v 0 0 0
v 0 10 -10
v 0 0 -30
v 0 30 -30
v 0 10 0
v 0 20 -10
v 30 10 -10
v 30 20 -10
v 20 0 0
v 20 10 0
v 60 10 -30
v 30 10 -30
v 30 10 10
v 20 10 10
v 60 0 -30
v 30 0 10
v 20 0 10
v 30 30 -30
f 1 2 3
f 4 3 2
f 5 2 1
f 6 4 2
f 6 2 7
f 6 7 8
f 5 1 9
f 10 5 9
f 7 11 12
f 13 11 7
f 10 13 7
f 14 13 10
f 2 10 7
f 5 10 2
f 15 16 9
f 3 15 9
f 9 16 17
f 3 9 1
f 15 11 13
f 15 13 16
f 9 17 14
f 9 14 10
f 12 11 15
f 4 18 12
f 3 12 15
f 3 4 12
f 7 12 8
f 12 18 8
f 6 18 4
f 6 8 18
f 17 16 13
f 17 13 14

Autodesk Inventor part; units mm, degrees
ref_plane "YZ Plane" through (0, 0, 0) normal (1, 0, 0) x (0, 1, 0)
ref_plane "XZ Plane" through (0, 0, 0) normal (0, 1, 0) x (-1, 0, 0)
ref_plane "XY Plane" through (0, 0, 0) normal (0, 0, 1) x (1, 0, 0)
sketch "草圖1" plane through (0, 0, 0) normal (0, 1, 0) x (-1, 0, 0)
  line L0 (0, 0) -> (-20, 0)
  line L1 (-20, 0) -> (-20, -30)
  line L2 (-20, -30) -> (0, -30)
  line L3 (0, -30) -> (0, 0)
  line L4 (-20, -30) -> (-60, -30)
  line L5 (-60, -30) -> (-60, 10)
  line L6 (-60, 10) -> (-20, 10)
  line L7 (-20, 10) -> (-20, -30)
  dimension "d0" = 20
  dimension "d1" = 40
  dimension "d2" = 40
  dimension "d3" = 30
extrude "擠出1" add sketch "草圖1" along normal blind 10
chamfer "倒角1" distance 30 distance2 40 1 edges at (60, 5, 10) measured on face at (33.3333, 3.3333, 10)
sketch "草圖2" plane through (0, 0, -30) normal (-1, 0, 0) x (0, 0, 1)
  line L0 (0, 0) -> (0, 10) projected
  line L1 (0, 10) -> (20, 10)
  line L2 (20, 10) -> (20, 30)
  line L3 (20, 30) -> (0, 30)
  line L4 (0, 30) -> (0, 10)
  point P0 (30, 0)
  dimension "d9" = 20
  dimension "d10" = 20
extrude "擠出2" add sketch "草圖2" against normal blind 30
chamfer "倒角2" distance 20 distance2 10 1 edges at (15, 30, -10) measured on face at (10, 30, -16.6667)
properties part number "43"
